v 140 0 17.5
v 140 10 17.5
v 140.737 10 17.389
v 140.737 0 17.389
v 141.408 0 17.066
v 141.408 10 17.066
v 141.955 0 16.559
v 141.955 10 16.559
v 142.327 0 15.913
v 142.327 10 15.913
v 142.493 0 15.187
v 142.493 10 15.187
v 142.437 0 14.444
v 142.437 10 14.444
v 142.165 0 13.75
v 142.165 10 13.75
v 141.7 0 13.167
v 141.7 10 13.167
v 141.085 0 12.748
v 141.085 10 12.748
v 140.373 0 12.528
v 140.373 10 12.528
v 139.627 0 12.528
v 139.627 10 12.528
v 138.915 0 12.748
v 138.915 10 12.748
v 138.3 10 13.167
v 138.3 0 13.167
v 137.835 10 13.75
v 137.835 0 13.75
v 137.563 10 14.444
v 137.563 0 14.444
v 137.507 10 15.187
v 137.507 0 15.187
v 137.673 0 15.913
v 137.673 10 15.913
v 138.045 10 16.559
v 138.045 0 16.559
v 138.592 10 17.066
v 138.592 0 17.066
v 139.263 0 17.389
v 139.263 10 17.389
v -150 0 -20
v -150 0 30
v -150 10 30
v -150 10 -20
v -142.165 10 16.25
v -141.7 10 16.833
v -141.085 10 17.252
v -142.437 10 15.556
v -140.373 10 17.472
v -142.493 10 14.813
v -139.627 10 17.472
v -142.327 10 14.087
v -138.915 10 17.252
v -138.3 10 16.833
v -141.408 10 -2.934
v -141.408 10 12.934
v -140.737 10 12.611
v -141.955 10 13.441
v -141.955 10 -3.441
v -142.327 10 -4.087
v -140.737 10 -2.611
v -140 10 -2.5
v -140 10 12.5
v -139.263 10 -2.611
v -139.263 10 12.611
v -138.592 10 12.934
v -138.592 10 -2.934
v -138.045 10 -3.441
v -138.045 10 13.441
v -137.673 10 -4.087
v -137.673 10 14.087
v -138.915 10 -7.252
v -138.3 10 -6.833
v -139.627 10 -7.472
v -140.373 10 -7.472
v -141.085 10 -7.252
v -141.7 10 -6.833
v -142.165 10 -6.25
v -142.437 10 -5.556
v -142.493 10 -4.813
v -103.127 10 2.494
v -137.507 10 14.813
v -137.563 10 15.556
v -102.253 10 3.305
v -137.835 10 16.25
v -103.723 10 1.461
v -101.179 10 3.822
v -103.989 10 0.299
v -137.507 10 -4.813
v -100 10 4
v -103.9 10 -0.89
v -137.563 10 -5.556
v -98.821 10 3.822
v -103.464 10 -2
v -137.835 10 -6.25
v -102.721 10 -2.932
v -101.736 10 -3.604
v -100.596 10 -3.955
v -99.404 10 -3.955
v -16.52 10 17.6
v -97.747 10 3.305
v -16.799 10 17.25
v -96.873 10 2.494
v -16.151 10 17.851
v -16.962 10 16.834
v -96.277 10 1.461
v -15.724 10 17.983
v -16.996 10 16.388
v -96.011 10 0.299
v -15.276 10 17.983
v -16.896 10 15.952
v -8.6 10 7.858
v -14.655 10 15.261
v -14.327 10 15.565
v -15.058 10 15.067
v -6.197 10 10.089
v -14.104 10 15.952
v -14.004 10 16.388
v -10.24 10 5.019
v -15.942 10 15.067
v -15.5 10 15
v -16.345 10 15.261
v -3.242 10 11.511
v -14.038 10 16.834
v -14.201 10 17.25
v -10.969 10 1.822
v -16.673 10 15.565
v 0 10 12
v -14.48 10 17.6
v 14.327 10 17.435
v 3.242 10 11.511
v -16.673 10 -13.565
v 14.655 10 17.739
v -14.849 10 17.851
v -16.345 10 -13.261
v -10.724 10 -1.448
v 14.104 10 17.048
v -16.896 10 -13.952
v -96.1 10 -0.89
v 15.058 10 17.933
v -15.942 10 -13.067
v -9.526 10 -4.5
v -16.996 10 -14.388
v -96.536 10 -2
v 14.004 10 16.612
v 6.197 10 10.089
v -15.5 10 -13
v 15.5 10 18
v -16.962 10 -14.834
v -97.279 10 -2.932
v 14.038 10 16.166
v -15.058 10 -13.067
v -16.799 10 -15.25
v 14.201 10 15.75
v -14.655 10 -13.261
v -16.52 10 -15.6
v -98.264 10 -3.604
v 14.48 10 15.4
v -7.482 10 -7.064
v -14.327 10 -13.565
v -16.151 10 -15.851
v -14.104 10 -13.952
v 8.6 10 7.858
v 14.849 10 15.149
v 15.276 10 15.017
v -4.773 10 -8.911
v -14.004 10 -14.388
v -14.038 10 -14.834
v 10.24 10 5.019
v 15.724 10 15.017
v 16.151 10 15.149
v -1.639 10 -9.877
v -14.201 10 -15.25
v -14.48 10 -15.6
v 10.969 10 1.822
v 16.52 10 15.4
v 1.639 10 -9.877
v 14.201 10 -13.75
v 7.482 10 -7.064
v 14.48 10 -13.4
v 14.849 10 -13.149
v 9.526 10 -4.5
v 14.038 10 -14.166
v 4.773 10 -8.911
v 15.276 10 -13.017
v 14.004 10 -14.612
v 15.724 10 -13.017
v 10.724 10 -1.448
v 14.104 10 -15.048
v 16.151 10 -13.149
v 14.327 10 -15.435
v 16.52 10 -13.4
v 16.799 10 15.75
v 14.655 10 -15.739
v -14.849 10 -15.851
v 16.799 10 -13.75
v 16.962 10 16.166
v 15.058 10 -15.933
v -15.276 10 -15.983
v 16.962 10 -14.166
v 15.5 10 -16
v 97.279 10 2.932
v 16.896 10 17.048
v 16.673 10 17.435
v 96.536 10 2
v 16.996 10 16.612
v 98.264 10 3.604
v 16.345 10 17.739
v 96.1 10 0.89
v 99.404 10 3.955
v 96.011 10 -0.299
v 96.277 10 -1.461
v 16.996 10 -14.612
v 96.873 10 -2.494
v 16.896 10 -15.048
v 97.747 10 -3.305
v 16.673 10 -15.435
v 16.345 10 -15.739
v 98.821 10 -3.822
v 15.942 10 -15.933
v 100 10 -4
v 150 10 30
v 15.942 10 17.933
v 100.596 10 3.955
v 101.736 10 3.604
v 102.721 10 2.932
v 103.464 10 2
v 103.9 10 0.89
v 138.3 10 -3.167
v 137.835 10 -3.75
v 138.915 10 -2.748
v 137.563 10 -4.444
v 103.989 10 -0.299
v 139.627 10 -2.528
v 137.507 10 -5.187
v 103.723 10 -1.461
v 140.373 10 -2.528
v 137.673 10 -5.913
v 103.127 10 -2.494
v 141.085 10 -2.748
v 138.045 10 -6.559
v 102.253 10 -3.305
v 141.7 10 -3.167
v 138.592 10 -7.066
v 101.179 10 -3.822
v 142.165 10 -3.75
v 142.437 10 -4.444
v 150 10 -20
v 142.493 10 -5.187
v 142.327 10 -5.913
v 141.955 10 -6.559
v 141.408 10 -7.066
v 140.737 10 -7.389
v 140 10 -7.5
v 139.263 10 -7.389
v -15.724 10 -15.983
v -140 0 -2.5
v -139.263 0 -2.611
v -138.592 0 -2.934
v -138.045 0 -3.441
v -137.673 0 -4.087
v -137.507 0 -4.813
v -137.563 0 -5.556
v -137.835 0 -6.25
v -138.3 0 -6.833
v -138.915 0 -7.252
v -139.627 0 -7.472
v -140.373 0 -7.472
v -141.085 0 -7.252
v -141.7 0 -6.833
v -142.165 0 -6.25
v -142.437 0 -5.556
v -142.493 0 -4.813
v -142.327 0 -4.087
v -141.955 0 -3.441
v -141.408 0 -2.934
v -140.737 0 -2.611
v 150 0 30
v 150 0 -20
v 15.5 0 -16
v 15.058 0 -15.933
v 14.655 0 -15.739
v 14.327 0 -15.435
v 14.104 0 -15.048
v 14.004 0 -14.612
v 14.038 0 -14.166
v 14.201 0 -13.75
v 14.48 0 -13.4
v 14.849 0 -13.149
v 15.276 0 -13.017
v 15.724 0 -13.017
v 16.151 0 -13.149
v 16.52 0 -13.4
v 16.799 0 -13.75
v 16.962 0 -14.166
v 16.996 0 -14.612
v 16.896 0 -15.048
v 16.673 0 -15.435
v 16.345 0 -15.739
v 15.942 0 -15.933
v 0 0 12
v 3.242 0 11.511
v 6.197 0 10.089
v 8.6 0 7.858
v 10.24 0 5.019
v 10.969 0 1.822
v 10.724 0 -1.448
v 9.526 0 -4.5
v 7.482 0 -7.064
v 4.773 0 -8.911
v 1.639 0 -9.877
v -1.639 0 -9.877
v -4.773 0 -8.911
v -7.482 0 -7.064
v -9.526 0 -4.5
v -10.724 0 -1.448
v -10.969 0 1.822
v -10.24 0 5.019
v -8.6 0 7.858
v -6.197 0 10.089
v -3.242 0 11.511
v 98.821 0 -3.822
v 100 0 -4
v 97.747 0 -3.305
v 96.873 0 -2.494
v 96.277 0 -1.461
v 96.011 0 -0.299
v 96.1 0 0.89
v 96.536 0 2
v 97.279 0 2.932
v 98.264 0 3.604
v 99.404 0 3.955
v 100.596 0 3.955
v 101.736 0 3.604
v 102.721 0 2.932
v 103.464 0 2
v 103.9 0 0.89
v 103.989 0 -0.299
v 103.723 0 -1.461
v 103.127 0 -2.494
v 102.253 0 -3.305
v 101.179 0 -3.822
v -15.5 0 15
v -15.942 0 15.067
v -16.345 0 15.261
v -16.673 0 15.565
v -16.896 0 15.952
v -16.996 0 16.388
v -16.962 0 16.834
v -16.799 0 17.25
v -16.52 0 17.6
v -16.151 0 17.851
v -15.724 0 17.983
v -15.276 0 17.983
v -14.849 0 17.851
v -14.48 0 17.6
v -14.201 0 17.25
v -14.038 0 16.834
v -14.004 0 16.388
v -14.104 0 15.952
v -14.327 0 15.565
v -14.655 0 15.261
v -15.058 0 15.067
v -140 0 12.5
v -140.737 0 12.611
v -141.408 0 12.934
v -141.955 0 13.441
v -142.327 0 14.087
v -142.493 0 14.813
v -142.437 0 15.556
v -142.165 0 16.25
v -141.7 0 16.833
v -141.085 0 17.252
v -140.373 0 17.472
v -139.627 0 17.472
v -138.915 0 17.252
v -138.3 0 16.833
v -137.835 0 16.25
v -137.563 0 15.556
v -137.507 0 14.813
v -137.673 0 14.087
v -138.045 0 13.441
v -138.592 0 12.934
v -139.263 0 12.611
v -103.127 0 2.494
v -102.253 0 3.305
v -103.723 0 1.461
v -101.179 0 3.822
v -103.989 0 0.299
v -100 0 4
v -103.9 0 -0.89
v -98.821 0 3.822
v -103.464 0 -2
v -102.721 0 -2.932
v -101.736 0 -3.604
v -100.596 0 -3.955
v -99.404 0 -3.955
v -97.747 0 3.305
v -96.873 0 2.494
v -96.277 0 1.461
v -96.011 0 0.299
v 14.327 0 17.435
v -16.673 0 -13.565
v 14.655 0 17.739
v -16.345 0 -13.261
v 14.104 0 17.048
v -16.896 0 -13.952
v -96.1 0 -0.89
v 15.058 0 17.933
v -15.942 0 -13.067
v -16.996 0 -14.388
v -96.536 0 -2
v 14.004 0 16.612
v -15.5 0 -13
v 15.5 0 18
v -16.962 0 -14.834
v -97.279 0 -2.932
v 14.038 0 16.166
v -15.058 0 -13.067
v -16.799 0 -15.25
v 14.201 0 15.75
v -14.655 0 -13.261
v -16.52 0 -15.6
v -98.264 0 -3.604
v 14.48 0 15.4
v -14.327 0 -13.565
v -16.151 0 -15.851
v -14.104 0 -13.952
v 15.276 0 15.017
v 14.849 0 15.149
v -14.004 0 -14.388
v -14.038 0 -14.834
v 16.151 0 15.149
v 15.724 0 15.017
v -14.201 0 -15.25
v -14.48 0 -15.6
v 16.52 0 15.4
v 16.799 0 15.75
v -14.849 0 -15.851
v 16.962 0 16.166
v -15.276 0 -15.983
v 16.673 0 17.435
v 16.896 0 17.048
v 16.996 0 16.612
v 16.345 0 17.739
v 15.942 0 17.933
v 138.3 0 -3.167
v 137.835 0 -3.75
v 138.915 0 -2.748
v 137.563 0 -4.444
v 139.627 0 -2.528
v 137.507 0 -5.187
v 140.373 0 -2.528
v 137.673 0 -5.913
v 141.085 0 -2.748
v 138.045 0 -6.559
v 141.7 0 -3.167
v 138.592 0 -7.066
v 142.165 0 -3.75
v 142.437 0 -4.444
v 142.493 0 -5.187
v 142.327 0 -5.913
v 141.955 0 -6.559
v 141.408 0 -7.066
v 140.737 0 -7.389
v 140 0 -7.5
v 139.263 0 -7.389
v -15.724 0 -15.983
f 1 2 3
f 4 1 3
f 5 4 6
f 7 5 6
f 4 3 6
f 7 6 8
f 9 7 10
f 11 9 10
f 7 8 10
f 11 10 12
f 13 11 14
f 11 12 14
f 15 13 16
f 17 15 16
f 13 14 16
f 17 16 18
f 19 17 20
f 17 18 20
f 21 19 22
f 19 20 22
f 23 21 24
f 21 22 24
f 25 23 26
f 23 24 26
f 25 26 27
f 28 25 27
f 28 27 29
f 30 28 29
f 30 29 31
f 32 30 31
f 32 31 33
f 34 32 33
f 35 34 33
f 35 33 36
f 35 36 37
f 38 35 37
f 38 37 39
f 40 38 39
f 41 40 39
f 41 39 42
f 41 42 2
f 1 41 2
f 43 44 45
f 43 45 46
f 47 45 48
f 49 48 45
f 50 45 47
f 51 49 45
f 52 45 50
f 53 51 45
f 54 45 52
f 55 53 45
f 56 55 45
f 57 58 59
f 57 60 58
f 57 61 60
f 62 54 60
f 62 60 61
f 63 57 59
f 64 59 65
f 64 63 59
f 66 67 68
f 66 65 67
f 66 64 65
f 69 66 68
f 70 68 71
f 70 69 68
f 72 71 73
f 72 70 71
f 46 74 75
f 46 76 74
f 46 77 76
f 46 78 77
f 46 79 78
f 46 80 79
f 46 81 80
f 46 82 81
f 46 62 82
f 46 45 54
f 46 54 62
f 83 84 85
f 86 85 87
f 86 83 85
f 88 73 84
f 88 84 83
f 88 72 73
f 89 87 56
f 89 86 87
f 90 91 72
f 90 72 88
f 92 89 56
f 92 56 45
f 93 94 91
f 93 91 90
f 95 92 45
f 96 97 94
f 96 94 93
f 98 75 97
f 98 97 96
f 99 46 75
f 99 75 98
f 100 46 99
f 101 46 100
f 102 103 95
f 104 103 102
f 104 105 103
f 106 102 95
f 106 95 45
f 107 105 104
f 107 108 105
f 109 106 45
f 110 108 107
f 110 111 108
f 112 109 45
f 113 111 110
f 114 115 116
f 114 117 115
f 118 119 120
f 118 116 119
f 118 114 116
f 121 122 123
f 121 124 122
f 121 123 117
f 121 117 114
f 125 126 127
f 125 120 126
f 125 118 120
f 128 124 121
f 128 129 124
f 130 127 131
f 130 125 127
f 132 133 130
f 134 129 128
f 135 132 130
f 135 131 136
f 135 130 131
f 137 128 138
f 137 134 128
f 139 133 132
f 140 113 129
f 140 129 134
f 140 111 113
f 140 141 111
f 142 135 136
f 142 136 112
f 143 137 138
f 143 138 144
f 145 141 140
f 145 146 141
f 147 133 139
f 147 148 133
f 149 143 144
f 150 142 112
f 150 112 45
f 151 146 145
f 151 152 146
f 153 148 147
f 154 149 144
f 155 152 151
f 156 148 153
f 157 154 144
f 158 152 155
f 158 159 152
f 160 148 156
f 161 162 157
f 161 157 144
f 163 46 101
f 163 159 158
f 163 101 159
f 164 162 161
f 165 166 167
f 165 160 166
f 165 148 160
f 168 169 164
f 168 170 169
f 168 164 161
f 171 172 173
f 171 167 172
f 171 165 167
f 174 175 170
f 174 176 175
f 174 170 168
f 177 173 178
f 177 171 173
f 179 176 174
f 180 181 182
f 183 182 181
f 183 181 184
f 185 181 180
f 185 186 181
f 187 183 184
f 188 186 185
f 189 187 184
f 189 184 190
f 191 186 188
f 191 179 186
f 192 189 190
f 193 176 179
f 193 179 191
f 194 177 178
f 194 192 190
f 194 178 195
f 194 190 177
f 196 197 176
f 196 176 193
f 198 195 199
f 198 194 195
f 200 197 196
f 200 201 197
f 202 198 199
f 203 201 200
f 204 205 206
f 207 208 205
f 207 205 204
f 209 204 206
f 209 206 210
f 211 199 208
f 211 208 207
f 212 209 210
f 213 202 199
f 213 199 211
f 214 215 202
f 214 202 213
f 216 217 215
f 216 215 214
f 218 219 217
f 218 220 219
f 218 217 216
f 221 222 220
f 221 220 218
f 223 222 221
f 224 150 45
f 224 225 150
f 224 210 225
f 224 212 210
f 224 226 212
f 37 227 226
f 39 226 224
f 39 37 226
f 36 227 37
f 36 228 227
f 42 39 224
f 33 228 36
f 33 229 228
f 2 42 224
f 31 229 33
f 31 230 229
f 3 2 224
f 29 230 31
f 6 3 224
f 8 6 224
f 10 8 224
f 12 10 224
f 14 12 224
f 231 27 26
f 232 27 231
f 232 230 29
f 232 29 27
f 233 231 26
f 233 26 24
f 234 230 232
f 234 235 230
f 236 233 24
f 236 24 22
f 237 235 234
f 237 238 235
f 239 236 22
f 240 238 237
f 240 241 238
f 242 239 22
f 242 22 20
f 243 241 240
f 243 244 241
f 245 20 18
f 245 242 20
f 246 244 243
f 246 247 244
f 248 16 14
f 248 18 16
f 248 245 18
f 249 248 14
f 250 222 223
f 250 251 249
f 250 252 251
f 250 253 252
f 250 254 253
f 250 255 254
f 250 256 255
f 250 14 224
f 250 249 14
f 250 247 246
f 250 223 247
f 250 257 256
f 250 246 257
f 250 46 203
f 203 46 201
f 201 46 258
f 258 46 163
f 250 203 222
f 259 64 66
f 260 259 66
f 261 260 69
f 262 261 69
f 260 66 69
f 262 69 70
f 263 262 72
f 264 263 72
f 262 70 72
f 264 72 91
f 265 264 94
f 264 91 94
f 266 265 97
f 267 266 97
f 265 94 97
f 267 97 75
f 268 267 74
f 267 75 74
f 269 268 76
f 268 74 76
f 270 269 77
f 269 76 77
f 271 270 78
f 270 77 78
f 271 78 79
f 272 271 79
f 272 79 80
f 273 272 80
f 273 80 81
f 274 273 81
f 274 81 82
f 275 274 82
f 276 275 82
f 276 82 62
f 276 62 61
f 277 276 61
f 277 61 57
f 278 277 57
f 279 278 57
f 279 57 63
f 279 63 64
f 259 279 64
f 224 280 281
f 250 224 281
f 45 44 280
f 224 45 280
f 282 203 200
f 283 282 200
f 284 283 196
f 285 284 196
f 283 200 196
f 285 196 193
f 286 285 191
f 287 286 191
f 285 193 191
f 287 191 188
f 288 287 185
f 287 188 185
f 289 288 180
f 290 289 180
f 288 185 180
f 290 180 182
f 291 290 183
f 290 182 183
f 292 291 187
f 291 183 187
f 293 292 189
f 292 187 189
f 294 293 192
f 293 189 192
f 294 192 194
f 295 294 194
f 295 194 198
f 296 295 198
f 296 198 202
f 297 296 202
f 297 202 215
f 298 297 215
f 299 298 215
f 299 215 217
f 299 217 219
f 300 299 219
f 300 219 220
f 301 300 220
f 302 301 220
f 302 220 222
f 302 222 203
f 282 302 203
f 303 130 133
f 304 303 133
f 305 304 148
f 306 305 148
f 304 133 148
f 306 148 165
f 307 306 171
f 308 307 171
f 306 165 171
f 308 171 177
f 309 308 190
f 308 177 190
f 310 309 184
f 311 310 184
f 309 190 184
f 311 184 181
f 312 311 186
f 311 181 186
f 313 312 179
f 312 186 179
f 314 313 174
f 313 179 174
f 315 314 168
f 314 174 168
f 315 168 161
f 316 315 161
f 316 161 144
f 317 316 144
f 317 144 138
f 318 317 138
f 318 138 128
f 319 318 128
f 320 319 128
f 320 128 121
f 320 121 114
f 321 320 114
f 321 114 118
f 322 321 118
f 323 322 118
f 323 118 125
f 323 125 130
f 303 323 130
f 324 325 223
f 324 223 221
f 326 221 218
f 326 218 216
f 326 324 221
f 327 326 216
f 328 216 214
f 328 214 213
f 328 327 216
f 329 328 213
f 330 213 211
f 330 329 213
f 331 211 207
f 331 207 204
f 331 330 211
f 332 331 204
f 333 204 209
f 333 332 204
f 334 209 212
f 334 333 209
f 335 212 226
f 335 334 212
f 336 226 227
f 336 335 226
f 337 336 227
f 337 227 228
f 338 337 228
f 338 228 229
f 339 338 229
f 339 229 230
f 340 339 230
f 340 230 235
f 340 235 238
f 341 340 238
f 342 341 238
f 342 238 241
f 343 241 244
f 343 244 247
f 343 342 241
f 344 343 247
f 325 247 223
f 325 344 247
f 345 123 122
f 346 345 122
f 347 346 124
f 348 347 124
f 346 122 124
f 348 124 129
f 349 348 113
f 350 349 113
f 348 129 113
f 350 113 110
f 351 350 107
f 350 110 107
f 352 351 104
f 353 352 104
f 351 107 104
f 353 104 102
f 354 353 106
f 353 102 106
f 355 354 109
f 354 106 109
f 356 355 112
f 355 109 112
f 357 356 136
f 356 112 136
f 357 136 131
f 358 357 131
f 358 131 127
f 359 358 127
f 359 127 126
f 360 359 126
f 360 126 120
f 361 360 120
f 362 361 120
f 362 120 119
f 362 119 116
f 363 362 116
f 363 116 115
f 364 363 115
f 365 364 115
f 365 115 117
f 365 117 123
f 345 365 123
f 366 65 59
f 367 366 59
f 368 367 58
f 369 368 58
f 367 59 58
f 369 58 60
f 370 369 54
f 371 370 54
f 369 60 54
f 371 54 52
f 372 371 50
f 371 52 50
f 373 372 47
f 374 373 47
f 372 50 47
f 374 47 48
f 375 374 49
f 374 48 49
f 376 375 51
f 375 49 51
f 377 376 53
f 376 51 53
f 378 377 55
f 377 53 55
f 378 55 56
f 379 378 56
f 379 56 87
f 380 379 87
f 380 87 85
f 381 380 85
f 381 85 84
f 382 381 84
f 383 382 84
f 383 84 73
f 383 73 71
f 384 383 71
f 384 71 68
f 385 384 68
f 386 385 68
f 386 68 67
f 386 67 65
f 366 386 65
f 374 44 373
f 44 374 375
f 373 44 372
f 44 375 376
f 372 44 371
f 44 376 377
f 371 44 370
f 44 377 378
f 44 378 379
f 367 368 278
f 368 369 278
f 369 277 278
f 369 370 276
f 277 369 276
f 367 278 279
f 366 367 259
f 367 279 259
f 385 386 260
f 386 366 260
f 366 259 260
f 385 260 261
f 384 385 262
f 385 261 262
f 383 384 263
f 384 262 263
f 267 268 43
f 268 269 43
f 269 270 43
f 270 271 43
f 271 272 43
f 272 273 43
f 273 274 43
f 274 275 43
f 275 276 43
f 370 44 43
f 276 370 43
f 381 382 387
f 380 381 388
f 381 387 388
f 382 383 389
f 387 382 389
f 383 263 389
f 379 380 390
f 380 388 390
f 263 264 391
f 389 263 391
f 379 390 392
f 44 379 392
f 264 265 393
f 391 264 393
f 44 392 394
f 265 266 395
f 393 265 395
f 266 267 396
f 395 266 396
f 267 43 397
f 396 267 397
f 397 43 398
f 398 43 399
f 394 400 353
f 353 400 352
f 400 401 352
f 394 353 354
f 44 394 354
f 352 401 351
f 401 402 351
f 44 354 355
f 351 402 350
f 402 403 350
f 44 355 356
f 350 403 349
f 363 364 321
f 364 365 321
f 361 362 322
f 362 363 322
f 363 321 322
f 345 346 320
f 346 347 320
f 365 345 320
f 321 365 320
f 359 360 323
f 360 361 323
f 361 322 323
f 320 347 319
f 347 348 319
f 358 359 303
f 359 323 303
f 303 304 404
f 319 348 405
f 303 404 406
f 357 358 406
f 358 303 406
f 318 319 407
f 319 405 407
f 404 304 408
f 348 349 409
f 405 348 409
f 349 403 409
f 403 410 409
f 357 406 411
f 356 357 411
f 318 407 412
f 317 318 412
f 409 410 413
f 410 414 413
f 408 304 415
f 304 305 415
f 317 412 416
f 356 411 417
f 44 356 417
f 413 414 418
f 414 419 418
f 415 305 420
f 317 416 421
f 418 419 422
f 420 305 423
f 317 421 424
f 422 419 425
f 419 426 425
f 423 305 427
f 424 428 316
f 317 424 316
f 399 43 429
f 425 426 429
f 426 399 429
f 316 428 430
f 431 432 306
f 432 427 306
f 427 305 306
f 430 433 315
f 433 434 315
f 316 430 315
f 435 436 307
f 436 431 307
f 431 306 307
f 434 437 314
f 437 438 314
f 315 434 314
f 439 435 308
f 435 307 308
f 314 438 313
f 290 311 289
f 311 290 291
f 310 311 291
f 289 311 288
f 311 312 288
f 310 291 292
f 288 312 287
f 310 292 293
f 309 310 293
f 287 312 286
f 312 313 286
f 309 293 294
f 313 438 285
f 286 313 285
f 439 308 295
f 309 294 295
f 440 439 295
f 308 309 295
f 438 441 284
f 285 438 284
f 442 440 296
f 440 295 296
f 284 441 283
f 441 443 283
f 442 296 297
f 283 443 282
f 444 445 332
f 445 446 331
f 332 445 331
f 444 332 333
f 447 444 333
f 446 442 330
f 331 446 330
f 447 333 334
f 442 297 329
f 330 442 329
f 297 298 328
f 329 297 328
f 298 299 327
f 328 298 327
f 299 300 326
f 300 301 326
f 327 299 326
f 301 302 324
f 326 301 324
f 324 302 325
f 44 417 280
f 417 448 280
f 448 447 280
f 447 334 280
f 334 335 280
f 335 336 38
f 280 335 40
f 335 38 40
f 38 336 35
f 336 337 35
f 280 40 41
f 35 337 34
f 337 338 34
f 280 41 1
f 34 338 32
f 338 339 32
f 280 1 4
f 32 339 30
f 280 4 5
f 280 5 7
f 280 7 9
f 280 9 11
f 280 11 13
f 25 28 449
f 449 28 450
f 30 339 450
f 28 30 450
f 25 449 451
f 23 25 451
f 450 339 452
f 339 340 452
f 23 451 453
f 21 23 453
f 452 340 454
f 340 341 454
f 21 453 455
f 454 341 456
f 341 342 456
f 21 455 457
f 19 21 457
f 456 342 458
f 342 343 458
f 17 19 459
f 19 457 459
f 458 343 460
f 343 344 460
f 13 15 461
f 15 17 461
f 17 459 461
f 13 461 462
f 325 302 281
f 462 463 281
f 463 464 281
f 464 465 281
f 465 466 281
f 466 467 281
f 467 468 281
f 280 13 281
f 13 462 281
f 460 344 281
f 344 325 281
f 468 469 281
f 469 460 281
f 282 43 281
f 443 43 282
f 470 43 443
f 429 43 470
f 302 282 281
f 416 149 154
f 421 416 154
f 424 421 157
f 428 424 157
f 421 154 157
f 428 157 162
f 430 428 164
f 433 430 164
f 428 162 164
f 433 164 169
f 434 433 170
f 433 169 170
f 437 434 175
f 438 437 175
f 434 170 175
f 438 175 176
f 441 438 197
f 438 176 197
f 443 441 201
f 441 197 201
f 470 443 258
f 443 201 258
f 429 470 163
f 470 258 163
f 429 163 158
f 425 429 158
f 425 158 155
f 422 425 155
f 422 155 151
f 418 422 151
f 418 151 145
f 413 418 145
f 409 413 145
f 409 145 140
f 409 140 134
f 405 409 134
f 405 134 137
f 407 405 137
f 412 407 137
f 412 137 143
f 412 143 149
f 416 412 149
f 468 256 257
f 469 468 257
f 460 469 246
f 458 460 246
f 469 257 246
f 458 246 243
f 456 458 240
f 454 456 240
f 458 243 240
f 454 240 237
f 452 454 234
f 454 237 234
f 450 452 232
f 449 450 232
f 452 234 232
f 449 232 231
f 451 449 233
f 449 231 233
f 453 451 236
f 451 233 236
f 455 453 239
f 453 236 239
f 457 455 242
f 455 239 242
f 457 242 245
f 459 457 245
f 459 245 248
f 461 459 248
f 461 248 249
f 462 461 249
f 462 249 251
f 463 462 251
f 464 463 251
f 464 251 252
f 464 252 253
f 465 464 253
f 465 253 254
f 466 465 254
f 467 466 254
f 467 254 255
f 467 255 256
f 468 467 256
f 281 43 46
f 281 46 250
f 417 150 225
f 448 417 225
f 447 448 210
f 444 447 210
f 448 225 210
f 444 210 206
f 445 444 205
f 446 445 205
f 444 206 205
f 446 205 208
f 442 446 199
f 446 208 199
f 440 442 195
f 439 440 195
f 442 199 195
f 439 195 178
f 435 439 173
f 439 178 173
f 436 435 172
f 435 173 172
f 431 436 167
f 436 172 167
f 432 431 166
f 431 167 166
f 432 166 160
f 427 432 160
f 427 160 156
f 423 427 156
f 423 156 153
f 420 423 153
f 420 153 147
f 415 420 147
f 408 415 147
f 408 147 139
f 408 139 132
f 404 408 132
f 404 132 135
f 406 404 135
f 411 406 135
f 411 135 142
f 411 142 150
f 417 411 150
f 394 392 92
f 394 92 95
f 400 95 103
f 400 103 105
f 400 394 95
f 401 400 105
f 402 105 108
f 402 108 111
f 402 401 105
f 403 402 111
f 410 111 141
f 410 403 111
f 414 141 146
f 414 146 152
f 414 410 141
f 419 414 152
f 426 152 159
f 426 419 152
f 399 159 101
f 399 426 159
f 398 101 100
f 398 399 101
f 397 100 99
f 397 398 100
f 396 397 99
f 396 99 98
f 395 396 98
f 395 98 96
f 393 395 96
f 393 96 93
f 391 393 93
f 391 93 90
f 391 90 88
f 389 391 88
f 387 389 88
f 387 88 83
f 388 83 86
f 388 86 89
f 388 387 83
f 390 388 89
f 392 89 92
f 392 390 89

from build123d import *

# Parameters (mm, degrees)
SKETCH1_W           = 300
SKETCH1_H           = 50
SKETCH1_R           = 4
MAIN_DEPTH          = 10
SKETCH4_R           = 2.5
MOUNT_DEPTH         = 154.297097168
SKETCH2_R           = 11
SKETCH2_R_2         = 1.5
STEPPER_MOUNT_DEPTH = 154.297097168


with BuildPart() as part:
    # Sketch1 → main (new body)
    with BuildSketch(Plane(origin=(0, 0, 0), x_dir=(1, 0, 0), z_dir=(0, 1, 0))):
        with Locations((0, -5)):
            Rectangle(SKETCH1_W, SKETCH1_H)
        with Locations(Location((-100, 0, 0), (0, 0, 270))):
            Circle(SKETCH1_R, mode=Mode.SUBTRACT)
        with Locations(Location((100, 0, 0), (0, 0, 90))):
            Circle(SKETCH1_R, mode=Mode.SUBTRACT)
    extrude(amount=MAIN_DEPTH)

    # Sketch4 → mount (cut, through all)
    with BuildSketch(Plane(origin=(0, 10, 0), x_dir=(1, 0, 0), z_dir=(0, 1, 0))):
        with Locations(Location((-140, 5, 0), (0, 0, 270))):
            Circle(SKETCH4_R)
        with Locations(Location((-140, -15, 0), (0, 0, 90))):
            Circle(SKETCH4_R)
        with Locations(Location((140, -15, 0), (0, 0, 270))):
            Circle(SKETCH4_R)
        with Locations(Location((140, 5, 0), (0, 0, 90))):
            Circle(SKETCH4_R)
    extrude(amount=-MOUNT_DEPTH, mode=Mode.SUBTRACT)

    # Sketch2 → stepper_mount (cut, through all)
    with BuildSketch(Plane(origin=(0, 10, 0), x_dir=(1, 0, 0), z_dir=(0, 1, 0))):
        with Locations(Location((0, -1, 0), (0, 0, 270))):
            Circle(SKETCH2_R)
        with Locations(Location((15.5, -16.5, 0), (0, 0, 270))):
            Circle(SKETCH2_R_2)
        with Locations(Location((-15.5, -16.5, 0), (0, 0, 90))):
            Circle(SKETCH2_R_2)
        with Locations(Location((-15.5, 14.5, 0), (0, 0, 270))):
            Circle(SKETCH2_R_2)
        with Locations(Location((15.5, 14.5, 0), (0, 0, 90))):
            Circle(SKETCH2_R_2)
    extrude(amount=-STEPPER_MOUNT_DEPTH, mode=Mode.SUBTRACT)


solid = part.part
